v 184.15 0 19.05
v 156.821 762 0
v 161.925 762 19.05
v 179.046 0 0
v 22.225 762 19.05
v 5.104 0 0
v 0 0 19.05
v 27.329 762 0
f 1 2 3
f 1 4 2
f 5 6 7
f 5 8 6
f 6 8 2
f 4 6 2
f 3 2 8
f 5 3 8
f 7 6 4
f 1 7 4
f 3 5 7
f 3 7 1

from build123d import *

# Parameters (mm, degrees)
F1_DEPTH = 19.05


with BuildPart() as f1:
    # F0 (on Top) → F1 (new body)
    with BuildSketch(Plane.XY):
        Polygon((22.2249564553, 762), (0, 0), (184.15, 0), (161.9249564553, 762), align=None)
    extrude(amount=F1_DEPTH)

    # F2 (on face) → F4 section 0
    with BuildSketch(Plane(origin=(0, 762, 0), x_dir=(-1, 0, 0), z_dir=(0, 1, 0))):
        Polygon((-156.8205243395, 0), (-161.9249564553, 19.05), (-161.9249564553, 0), align=None)
    # F3 (on face) → F4 section 1
    with BuildSketch(Plane.XZ):
        Polygon((184.15, 0), (184.15, 19.05), (179.0455678842, 0), align=None)
    loft(mode=Mode.SUBTRACT)

    # F5 (on face) → F7 section 0
    with BuildSketch(Plane.XZ):
        Polygon((0, 19.05), (0, 0), (5.1044321158, 0), align=None)
    # F6 (on face) → F7 section 1
    with BuildSketch(Plane(origin=(0, 762, 0), x_dir=(-1, 0, 0), z_dir=(0, 1, 0))):
        Polygon((-22.2249564553, 0), (-22.2249564553, 19.05), (-27.3293885711, 0), align=None)
    loft(mode=Mode.SUBTRACT)


solid = f1.part
